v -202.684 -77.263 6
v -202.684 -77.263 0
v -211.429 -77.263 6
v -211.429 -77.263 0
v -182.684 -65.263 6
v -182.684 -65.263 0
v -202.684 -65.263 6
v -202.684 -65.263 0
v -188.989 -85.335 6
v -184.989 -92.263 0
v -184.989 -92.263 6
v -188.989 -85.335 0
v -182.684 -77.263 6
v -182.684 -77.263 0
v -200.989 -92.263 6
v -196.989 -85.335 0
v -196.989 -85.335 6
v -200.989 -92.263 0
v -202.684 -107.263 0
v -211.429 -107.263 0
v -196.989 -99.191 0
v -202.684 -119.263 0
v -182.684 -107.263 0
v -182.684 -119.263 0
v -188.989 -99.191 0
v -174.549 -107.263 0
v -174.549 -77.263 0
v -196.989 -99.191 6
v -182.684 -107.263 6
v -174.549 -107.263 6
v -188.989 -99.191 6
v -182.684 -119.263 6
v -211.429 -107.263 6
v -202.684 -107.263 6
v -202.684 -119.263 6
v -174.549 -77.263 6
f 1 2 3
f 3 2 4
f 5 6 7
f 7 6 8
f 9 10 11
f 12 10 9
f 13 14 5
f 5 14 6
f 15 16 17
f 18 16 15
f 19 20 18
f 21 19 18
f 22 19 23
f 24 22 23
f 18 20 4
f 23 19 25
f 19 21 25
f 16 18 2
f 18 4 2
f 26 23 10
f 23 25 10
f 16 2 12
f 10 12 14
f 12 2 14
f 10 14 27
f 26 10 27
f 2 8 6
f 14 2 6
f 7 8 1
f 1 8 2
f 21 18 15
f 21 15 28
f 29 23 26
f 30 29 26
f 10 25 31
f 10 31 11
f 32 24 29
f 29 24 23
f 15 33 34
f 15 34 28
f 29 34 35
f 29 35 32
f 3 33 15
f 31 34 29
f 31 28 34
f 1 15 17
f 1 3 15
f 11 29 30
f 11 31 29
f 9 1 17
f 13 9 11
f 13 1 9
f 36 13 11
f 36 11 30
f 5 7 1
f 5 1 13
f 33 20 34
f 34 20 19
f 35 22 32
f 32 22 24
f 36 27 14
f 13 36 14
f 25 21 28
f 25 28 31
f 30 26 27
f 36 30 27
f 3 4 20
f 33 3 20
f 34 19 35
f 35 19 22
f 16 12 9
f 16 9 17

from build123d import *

# Parameters (mm, degrees)
BOSS_EXTRUDE1_DEPTH = 6


with BuildPart() as part:
    # Sketch1 → Boss-Extrude1 (new body)
    with BuildSketch(Plane.XY):
        Polygon((-211.428617248, -77.262954902), (-211.428617248, -107.262954902), (-202.683627049, -107.262954902), (-202.683627049, -113.262954902), (-202.683627049, -119.262954902), (-182.683627049, -119.262954902), (-182.683627049, -113.262954902), (-182.683627049, -107.262954902), (-174.549373808, -107.262954902), (-174.549373808, -77.262954902), (-182.683627049, -77.262954902), (-182.683627049, -71.262954902), (-182.683627049, -65.262954902), (-202.683627049, -65.262954902), (-202.683627049, -71.262954902), (-202.683627049, -77.262954902), align=None)
        Polygon((-184.988995528, -92.262954902), (-188.988995528, -85.334751672), (-196.988995528, -85.334751672), (-200.988995528, -92.262954902), (-196.988995528, -99.191158133), (-188.988995528, -99.191158133), align=None, mode=Mode.SUBTRACT)
    extrude(amount=BOSS_EXTRUDE1_DEPTH)


solid = part.part
